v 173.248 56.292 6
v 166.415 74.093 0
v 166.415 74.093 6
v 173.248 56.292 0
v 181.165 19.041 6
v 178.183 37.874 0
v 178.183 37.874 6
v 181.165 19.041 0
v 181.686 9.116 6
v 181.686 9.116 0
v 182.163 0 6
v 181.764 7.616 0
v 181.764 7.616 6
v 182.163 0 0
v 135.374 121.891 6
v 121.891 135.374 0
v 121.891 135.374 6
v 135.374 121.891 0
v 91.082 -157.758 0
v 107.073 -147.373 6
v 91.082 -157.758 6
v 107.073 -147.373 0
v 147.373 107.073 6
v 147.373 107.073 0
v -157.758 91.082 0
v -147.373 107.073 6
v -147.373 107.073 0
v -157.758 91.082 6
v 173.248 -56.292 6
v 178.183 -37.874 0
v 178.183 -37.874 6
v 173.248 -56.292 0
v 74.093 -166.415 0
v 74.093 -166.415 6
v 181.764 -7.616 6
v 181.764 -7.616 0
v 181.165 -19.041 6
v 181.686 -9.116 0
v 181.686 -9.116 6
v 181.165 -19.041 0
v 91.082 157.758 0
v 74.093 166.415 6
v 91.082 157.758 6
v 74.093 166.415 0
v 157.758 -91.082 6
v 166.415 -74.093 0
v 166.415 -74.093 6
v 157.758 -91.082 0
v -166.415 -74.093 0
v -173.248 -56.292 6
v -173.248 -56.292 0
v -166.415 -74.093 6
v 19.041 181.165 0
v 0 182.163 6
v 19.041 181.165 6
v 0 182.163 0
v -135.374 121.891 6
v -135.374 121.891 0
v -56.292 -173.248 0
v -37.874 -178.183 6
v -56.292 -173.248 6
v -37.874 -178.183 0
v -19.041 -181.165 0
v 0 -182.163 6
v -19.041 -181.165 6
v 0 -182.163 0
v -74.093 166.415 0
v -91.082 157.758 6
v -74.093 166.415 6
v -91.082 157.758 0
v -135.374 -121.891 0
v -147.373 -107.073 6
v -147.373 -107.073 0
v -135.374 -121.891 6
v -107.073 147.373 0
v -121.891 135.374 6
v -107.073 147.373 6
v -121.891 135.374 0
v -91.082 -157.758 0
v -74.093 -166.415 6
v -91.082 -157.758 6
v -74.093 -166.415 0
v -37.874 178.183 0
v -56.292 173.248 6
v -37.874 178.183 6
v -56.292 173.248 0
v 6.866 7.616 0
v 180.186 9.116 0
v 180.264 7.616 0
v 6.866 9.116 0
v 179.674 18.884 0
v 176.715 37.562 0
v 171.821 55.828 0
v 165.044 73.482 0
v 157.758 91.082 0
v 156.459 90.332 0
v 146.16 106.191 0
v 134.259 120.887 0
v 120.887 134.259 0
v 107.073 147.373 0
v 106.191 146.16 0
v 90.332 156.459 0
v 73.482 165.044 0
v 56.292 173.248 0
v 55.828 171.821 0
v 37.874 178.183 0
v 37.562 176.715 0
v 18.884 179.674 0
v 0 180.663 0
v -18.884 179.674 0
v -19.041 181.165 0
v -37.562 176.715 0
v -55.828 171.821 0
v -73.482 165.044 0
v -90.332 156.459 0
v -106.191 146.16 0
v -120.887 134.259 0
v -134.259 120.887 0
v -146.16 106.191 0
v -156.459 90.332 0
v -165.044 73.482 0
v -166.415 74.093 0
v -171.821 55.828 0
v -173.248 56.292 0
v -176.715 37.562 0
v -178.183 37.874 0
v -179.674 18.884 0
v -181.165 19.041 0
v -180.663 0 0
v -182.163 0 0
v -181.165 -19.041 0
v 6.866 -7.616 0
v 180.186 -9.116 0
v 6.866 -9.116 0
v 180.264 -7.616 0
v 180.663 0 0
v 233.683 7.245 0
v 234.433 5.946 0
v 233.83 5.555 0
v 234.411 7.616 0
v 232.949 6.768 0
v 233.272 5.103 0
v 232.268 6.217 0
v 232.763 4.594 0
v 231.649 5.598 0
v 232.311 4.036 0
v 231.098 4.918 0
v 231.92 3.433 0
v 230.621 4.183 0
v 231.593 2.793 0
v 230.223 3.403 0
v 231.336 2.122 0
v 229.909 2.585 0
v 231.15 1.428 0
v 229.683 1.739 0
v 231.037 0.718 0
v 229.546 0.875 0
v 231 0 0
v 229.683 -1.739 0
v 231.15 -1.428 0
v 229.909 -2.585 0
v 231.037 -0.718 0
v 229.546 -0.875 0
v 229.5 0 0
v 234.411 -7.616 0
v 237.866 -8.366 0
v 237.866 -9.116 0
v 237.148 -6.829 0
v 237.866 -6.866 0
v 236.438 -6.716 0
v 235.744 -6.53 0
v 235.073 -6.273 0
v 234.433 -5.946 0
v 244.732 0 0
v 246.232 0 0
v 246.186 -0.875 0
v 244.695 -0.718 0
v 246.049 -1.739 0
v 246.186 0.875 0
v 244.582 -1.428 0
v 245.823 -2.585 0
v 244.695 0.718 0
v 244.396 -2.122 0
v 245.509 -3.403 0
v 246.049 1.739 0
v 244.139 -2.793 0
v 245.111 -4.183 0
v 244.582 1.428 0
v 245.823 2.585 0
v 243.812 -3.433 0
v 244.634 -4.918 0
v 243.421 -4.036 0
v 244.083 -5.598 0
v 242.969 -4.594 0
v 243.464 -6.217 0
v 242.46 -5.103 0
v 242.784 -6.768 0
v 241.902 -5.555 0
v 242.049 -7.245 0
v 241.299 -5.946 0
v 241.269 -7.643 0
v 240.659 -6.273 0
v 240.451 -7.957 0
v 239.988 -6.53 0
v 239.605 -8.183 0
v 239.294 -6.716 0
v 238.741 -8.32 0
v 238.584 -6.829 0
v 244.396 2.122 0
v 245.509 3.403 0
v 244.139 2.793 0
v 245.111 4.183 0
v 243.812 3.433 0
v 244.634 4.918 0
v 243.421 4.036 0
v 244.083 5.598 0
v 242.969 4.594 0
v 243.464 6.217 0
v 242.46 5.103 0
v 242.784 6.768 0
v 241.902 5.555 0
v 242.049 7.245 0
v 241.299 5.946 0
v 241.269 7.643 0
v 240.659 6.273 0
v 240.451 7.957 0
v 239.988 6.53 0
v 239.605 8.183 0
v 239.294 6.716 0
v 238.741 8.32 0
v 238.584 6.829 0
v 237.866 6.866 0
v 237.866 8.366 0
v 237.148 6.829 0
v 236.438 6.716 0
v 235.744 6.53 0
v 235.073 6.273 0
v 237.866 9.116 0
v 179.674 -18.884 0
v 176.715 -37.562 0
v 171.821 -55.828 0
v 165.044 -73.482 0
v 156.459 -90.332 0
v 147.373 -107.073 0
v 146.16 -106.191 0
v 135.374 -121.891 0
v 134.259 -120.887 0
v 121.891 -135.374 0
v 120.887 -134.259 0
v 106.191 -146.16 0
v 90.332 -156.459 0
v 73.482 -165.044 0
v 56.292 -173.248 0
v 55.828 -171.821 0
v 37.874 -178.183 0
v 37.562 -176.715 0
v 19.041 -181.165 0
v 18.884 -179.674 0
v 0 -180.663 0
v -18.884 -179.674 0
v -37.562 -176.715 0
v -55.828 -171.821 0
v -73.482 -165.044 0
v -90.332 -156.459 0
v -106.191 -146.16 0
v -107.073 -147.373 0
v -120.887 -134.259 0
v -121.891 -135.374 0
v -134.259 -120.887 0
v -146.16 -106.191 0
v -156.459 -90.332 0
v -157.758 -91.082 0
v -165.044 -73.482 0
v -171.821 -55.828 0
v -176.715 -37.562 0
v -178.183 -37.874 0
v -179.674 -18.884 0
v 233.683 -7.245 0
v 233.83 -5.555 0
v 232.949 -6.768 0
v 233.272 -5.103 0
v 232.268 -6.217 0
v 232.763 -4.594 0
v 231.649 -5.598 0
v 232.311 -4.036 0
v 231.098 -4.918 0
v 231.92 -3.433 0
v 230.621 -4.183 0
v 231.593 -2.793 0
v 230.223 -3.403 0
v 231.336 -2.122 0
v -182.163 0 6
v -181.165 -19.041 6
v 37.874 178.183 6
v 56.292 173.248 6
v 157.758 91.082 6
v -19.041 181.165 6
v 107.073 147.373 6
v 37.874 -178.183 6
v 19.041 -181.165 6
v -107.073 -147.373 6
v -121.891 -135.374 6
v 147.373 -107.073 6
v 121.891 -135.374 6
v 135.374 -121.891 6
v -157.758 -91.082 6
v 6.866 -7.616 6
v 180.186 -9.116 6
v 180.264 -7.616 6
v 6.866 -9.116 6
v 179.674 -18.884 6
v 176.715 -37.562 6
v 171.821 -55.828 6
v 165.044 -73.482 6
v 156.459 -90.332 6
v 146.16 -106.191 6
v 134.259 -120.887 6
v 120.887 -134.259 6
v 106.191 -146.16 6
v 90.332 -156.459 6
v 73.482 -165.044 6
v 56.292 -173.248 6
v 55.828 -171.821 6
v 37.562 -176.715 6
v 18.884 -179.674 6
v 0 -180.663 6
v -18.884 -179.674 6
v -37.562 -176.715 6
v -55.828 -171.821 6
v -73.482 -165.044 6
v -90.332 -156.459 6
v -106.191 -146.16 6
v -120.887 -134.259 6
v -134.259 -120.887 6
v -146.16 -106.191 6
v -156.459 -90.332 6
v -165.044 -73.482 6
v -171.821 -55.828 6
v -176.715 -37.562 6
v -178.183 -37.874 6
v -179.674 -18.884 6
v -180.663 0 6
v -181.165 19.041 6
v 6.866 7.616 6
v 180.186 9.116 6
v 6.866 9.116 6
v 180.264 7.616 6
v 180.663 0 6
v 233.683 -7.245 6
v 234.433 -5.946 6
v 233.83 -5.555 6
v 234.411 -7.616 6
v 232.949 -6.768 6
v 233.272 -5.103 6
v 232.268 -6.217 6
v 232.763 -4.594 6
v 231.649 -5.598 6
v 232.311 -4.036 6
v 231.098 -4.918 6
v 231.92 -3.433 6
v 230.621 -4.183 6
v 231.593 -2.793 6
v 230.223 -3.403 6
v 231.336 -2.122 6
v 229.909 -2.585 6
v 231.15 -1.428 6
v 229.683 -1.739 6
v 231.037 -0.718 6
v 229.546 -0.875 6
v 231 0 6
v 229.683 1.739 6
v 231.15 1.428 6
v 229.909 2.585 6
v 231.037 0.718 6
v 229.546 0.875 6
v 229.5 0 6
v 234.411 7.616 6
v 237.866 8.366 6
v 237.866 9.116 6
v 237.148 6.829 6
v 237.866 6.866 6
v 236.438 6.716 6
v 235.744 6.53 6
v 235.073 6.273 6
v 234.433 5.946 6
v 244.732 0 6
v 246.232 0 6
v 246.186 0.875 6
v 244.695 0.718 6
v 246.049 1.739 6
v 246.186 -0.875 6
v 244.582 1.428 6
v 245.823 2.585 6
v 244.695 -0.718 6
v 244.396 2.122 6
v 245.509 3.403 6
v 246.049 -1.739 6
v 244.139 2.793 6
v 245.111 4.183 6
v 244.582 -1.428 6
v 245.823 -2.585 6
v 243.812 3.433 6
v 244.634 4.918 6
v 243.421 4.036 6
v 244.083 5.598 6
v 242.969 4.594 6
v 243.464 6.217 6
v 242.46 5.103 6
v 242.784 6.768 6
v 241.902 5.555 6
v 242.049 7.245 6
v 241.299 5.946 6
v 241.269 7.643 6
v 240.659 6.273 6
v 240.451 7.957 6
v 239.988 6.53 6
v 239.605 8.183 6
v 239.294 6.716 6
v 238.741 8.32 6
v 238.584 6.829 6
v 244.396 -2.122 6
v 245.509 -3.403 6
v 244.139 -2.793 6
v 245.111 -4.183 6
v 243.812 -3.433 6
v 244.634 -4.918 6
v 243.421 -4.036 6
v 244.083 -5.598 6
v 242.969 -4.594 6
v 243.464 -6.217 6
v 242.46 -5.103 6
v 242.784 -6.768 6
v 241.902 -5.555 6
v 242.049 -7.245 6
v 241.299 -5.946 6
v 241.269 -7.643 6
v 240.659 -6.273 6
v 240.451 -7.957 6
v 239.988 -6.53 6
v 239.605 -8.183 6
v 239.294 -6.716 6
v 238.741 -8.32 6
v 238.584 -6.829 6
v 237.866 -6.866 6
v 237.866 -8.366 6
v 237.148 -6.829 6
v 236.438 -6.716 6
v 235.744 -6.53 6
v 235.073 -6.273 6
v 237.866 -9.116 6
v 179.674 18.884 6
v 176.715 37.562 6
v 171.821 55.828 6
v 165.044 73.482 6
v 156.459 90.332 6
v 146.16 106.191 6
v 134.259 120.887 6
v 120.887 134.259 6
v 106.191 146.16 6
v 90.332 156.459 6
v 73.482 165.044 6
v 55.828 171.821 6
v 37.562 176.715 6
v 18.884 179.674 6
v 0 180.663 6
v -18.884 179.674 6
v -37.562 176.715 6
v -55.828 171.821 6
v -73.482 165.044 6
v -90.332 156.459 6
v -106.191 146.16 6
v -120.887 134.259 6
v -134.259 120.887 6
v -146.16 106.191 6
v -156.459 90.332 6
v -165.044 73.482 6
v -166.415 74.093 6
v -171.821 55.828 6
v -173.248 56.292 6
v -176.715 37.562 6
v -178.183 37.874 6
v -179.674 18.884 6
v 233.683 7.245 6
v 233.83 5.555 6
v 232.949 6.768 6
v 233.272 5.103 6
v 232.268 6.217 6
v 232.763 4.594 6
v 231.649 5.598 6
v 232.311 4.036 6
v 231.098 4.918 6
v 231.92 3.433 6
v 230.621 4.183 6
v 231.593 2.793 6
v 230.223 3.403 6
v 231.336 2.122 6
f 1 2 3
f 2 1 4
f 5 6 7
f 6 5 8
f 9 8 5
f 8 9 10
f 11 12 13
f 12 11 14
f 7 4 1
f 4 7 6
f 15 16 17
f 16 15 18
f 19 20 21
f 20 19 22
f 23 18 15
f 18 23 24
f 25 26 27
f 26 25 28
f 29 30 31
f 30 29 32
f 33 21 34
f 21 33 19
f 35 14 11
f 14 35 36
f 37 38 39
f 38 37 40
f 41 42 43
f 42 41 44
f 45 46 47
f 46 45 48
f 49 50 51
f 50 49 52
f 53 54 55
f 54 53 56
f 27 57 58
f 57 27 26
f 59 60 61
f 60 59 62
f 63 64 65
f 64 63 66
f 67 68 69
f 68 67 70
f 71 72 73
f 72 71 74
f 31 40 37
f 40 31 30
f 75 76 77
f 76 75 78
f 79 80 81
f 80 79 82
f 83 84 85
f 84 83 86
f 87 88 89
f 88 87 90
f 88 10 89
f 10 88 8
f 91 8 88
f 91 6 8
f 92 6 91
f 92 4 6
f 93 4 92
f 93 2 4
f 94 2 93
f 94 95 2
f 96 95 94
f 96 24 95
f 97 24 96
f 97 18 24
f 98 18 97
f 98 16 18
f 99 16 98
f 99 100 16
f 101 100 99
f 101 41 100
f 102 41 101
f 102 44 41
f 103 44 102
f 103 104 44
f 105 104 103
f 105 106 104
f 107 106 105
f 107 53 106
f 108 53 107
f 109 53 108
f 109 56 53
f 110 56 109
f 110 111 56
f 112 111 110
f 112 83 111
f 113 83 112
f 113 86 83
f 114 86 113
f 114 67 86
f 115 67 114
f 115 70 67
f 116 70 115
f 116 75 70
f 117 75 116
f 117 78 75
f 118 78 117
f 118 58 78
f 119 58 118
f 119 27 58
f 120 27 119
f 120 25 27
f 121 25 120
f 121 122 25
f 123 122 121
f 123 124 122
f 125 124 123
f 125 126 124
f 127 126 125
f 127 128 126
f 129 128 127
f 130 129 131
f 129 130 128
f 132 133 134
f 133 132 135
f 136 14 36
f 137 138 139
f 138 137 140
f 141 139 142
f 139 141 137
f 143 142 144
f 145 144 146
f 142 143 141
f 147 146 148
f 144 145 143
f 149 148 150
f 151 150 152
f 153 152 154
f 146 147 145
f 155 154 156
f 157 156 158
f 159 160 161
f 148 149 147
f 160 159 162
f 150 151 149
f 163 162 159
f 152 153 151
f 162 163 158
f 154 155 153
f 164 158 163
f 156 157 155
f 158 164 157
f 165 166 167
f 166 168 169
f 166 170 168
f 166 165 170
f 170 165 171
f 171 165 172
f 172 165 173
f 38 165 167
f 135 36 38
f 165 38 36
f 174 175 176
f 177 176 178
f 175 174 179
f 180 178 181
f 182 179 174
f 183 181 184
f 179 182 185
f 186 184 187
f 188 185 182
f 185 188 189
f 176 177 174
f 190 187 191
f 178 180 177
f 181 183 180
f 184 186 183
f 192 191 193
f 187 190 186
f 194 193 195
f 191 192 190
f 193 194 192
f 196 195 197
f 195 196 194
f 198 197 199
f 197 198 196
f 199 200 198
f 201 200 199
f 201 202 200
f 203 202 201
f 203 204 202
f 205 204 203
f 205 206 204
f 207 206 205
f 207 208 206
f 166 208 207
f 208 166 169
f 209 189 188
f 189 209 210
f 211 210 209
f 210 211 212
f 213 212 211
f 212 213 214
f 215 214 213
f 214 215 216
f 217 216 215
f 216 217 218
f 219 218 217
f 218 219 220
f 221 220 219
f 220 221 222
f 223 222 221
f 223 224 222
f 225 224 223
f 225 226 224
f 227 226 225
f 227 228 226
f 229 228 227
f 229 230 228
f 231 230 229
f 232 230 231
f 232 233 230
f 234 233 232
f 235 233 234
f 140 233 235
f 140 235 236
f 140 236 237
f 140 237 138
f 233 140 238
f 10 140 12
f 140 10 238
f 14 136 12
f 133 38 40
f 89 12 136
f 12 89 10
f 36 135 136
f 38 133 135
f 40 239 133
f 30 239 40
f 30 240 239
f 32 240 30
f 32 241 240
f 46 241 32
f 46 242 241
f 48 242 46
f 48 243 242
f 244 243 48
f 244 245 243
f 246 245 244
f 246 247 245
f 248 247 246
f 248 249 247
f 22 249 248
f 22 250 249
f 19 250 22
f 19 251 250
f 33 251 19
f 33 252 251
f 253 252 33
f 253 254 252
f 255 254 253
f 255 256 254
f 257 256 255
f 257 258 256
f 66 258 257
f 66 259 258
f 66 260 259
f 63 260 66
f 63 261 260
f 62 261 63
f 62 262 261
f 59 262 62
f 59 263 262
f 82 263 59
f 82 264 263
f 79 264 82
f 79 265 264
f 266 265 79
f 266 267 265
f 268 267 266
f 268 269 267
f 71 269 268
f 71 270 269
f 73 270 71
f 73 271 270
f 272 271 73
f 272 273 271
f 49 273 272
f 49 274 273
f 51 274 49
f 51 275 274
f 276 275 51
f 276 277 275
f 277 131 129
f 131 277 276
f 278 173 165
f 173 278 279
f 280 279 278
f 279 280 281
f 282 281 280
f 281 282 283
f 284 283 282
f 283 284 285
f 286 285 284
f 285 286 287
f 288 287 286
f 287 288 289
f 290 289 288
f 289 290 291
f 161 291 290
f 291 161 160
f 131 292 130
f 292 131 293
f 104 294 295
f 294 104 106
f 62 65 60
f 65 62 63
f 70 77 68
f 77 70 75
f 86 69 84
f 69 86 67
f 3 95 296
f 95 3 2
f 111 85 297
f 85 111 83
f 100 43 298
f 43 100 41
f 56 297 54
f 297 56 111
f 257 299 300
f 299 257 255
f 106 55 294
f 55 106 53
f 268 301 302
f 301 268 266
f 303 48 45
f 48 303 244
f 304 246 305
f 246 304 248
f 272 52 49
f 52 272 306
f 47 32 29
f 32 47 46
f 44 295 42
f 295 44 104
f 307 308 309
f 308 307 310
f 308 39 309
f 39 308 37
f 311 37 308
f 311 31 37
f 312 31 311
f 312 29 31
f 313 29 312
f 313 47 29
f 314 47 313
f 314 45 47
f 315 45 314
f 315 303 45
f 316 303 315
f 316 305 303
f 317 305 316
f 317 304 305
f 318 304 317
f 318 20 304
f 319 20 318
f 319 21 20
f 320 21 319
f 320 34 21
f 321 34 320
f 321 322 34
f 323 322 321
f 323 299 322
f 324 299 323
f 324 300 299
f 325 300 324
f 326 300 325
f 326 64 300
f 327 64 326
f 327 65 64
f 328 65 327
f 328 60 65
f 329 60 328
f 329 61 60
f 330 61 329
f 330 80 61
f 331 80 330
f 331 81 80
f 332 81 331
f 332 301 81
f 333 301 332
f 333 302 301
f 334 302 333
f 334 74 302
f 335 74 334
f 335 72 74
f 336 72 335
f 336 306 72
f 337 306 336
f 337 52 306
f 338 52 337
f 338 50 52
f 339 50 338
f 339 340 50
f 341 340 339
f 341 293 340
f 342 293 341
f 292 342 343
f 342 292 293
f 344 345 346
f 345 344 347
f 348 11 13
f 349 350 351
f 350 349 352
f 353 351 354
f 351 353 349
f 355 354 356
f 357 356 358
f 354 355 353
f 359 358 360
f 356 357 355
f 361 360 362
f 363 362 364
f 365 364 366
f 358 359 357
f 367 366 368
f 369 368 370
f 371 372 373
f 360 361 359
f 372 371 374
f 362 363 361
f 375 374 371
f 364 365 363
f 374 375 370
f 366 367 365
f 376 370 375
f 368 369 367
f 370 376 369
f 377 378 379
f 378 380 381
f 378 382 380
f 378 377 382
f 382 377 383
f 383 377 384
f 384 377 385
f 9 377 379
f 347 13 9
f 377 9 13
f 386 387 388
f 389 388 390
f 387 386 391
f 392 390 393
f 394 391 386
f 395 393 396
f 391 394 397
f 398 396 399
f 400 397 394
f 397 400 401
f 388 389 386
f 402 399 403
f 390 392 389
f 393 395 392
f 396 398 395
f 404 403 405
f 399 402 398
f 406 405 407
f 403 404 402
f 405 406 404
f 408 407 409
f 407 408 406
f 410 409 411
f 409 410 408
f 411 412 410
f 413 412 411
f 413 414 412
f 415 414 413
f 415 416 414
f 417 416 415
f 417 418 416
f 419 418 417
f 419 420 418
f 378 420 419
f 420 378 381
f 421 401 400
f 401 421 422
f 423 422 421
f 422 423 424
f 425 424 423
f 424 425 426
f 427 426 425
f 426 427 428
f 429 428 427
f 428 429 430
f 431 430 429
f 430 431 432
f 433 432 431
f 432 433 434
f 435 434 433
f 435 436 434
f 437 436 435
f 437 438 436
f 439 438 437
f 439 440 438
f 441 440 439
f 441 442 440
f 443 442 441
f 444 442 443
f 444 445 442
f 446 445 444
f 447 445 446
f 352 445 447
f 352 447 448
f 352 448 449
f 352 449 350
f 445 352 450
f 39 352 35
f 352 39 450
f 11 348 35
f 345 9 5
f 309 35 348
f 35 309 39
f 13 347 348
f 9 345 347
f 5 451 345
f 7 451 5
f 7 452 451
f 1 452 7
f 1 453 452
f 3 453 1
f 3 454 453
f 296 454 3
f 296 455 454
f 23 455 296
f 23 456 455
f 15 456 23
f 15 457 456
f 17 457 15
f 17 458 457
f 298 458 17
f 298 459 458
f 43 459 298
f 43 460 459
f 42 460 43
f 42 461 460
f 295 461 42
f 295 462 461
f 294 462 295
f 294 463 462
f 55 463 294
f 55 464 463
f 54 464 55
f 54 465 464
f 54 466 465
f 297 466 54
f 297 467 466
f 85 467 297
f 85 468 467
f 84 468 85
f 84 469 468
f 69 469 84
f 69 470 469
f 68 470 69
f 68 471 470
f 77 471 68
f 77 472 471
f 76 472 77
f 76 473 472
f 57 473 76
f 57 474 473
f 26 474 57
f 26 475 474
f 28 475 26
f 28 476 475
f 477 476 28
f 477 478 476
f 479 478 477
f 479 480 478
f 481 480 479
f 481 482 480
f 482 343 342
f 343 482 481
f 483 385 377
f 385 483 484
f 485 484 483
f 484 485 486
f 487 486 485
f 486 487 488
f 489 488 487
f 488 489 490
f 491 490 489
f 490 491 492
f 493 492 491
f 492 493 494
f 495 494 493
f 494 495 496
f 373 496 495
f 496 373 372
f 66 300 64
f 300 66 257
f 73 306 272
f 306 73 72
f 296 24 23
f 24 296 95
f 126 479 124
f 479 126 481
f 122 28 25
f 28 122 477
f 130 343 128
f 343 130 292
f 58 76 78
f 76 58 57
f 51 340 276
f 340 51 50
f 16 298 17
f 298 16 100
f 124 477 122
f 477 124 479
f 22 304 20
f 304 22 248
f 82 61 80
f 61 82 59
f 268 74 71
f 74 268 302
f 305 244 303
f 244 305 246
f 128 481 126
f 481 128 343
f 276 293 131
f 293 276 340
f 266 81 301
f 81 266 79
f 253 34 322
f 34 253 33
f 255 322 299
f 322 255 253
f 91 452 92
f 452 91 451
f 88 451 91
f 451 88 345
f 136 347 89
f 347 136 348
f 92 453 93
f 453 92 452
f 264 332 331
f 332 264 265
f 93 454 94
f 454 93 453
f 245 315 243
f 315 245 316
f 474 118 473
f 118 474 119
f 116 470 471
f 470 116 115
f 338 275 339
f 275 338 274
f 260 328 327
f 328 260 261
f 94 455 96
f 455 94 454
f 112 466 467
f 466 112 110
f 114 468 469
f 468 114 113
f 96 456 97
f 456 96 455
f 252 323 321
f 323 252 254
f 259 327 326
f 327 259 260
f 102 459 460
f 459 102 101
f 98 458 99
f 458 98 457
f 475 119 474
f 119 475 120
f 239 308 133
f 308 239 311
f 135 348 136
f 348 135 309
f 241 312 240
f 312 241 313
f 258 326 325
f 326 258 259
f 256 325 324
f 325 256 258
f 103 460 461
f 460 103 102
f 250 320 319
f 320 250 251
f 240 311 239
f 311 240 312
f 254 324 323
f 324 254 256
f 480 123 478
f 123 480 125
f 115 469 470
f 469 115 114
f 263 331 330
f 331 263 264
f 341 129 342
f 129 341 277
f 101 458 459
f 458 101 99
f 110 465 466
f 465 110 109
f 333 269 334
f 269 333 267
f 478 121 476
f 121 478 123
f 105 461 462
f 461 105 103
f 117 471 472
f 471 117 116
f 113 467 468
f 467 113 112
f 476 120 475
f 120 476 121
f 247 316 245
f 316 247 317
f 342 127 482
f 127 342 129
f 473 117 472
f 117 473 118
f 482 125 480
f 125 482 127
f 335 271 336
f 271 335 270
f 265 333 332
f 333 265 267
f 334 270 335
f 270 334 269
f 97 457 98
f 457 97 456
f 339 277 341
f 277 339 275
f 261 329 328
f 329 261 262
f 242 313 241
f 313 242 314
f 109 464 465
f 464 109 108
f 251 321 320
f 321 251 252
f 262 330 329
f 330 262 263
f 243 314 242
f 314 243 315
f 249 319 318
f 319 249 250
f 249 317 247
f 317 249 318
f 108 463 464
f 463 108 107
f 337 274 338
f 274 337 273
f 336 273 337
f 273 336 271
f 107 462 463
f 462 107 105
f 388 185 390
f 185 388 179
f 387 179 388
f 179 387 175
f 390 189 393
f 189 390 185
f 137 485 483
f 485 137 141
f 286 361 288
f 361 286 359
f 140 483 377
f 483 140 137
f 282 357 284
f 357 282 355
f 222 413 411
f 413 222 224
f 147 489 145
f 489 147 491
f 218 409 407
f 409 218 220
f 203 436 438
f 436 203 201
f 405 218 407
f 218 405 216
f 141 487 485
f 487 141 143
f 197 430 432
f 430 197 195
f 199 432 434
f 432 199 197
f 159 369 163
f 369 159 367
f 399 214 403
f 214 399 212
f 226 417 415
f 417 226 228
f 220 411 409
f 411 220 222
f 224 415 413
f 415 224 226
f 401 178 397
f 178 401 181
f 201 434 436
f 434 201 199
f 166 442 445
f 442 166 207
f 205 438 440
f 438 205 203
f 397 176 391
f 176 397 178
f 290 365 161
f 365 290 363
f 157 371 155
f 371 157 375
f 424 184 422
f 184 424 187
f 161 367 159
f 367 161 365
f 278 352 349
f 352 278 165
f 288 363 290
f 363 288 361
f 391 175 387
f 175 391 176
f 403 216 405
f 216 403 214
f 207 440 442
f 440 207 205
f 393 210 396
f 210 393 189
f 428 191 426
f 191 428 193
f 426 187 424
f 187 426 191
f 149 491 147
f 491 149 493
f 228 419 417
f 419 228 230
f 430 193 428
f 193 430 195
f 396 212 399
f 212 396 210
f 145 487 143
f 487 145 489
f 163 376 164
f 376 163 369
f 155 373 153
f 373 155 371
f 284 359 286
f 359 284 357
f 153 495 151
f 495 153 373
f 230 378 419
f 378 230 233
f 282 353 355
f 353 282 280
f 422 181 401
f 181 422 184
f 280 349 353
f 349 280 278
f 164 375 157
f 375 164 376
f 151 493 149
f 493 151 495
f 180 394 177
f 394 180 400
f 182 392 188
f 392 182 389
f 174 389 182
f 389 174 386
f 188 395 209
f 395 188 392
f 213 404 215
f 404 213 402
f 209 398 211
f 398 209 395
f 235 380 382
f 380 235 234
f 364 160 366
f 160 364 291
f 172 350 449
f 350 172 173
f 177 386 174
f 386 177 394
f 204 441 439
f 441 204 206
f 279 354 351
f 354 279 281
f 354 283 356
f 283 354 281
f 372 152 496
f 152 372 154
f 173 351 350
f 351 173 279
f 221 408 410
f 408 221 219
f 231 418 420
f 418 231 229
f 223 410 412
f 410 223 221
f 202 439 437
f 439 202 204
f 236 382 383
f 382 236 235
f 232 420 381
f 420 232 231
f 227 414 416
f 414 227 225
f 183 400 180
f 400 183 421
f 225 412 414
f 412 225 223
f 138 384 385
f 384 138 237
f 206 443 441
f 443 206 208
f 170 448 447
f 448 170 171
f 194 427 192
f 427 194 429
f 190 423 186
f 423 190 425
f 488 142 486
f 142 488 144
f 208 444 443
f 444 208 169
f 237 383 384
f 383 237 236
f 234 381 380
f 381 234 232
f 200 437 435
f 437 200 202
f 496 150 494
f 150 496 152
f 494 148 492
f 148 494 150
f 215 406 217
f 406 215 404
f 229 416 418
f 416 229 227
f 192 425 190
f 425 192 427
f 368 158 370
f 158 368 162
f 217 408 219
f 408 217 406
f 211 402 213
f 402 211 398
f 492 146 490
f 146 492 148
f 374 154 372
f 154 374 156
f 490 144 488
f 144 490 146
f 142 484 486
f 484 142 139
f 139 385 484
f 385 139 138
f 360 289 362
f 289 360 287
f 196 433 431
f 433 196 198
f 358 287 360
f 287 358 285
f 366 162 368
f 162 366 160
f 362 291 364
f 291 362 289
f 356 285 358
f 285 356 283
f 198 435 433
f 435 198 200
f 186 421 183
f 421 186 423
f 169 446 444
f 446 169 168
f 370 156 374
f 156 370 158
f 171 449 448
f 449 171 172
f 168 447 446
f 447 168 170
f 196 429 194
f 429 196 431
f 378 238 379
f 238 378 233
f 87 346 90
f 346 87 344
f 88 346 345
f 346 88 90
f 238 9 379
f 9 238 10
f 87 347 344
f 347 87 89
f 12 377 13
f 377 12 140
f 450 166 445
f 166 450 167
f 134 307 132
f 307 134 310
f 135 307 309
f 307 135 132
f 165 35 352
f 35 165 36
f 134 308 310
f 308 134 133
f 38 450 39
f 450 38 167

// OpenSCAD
// file: _params.scad
// =========================================================================
// 공유 파라미터 (모든 개별 부품 파일에서 include)
// 메인 어셈블리: cup_z_x_catrage_frame_water_mic_anti_3030.scad 에서 추출
// 프레임: 600 × 420 × 700mm (3030 프로파일, Y=0 대칭)
// =========================================================================

$fn = 60;  // 부품 출력용 고해상도
GLOBAL_TOLERANCE = 0.2;

// --- [1] 하부 기성품 및 원통 파라미터 ---
X_RAIL_LEN = 290.0;
X_BLOCK_W = 30.0; X_BLOCK_L = 32.0;   // 신규 X슬라이더 블록 (폭 30mm × 길이 32mm)
X_PITCH_X = 20.0; X_PITCH_Y = 20.0;   // 체결 홀 피치 (20 × 20mm, M3 나사탭 4개)
X_RAIL_W = 30.0;  X_RAIL_H = 20.0;   // 레일 폭 30mm (레일 바닥~블록 윗면 높이 29mm 반영)
X_TOTAL_H = 29.0;                    // 레일 바닥에서 슬라이더 블록 윗면까지의 높이

MOTOR_W = 42.0;      MOTOR_PITCH = 31.0; MOTOR_HOLE_D = 3.5;    
MOTOR_BOSS_D = 22.0; MOTOR_BOSS_H = 2.0; SCREW_D = 8.0;         
MOT_BODY_L = 41.0;   SHAFT_L = 24.0;     // 실측 NEMA17 몸통 41mm / 축 돌출 24mm

CUP_ID = 99.5;  CUP_WALL = 5.0; CUP_OD = 110.0;     // 아크릴 원통 OD110/ID100
CUP_H = 180.0;   CAGE_H = 60.0;  FLOOR_H = 10.0; PISTON_H = 20.0;     

LIP_D = 30.0;    LIP_H = 5.0;    LEAK_DRAIN_D = 4.0;    
GUIDE_PIPE_D = 8.0; BUSHING_OD = 12.0; BUSHING_H = 8.0;       
DRAIN_RADIUS = 35.0; DRAIN_D = 8.0;        

Y_OFFSET = 85.0; BRKT_H = 12.0; BRKT_D = 122.0; BRKT_ID = 62.0; Z_MOUNT_PCD = 86.0;   

// --- [2] 아크릴 파이프 및 상부 카트리지 ---
ACRYL_ID = 100.0; ACRYL_T = 5.0; ACRYL_OD = ACRYL_ID + (ACRYL_T * 2);  // OD110 (아크릴집 106 재고없음 → 컵과 동일 규격)

REVOLVER_PCD = 240.0;     // 인접 카트리지 웹 9.8mm 확보 (OD110 대응, 230→240)
CARTRIDGE_OD = REVOLVER_PCD + ACRYL_OD + 8; 
TOP_PLATE_H = 15.0;       // 아크릴 15T 통판 (보스홀 단 깊이 10mm)

HUB_D = 60.0;            
SHAFT_D = 12.0;          
HUB_WALL = 4.0;          
HUB_H = 15.0;             // 아크릴 5T × 3장 적층 — 파이프 130mm 대응
POCKET_DEPTH = 5.0;
MID_HUB_Z = 63.5;          // 중단 허브 하면 Z (벨트 중심 Z=71.0mm 정렬, 풀리 상단 Z=75.0mm = 축상단-1mm)
UPPER_HUB_Z = 135.0;       // 상단 허브 하면 Z (전체 135+15=150 유지)
BOSS_OD = 35.0;
BOSS_H = 11.0;             // 보스11 + 와셔1 = 12, 리세스10 → 허브 2mm 공중

// --- [3] GT2 벨트 구동 시스템 ---
GT2_PITCH     = 2.0;
GT2_BELT_W    = 6.0;
BIG_PULLEY_TEETH = 566;
BIG_PULLEY_PD = BIG_PULLEY_TEETH * GT2_PITCH / PI;
BIG_PULLEY_OD = BIG_PULLEY_PD + 1.0;
SMALL_PULLEY_TEETH = 20;
SMALL_PULLEY_PD = SMALL_PULLEY_TEETH * GT2_PITCH / PI;
SMALL_PULLEY_OD = SMALL_PULLEY_PD + 1.0;

BELT_MOTOR_X = -300;
BELT_MOTOR_Y = -155.5;
BRKT_MOTOR_H = 25.0;
BRKT_MOTOR_W = 45.0;        // 브래킷 폭 45mm (프로파일 간섭 회피 복원)
SLOT_LEN = 10.0;
FLAG_W = 15.0;  FLAG_H = 8.0;  FLAG_T = 1.5;

X_POS_MEASURE = 170.0;   // 측정 브래킷 X좌표 (X_M~X_R 정중앙, X대칭)

// --- [4] 3030 프레임 경계 (600×430×700mm) ---
PF = 30;             // 3030 알루미늄 프로파일
WASHER_T = 1.0;     

X_L = -320;
X_M = 60;
X_R = 250;
Y_F = -210;          // 전방 (대칭: -210+30=-180, Y=0 중심)
Y_B = 180;           // 후방 (대칭: 180+30=210, Y=0 중심) — 메인파일과 동기화

Z_BOT = -480;
Z_RAIL = -322;
Z_MID = -TOP_PLATE_H - PF;
Z_TOP = 220;

SUPPORT_PILLAR_H = Z_TOP - PF;

SHAFT_SQ = 20;       // 2020 사각 회전축

// 사각 축 홀 크기
SQ = SHAFT_SQ + GLOBAL_TOLERANCE;  // 20.2mm

// --- 리볼버/컵 축 정렬 (보스홀=판 중심에 리볼버 정렬) ---
REVOLVER_CX = (X_L + X_M + PF)/2;        // 판 중심 = 보스홀 = 리볼버 회전축 (-115)
DROP_X      = REVOLVER_CX + REVOLVER_PCD/2;  // 링 드롭 / 컵 적재 축 (+5)

FLANGE_Z = 52.0;       // 모터 전면 안착 높이 (Z=52mm -> 축 상단 Z=76mm, 풀리 결합)

// --- [5] 모터 체결홀 (이미 제작 완료된 15T 상판 원본 도면 수치 100% 유지) ---
MOTOR_BOLT_PITCH     = 25.0;      // Y피치 (Y = ±12.5mm)
MOTOR_BOLT_X_NOMINAL = X_L + 55;  // 1열: 상판 좌단 55 (모터축 기준 +35mm = X=-265mm)
MOTOR_BOLT_X_SHIFT   = X_L + 40;  // 2열: 상판 좌단 40 (모터축 기준 +20mm = X=-280mm)

// 모터 마운트 볼트 카운터보어 (단볼트용 — 브래킷 두께 25 중 깊게 파냄)
MOTOR_CB_D     = 6.5;            // M3 캡볼트 머리 클리어런스
MOTOR_CB_DEPTH = 19;             // 카운터보어 깊이 (잔여 통과 6mm → M3×10 단볼트)
// main file
// =========================================================================
// [구매] GT2 타이밍 벨트
// 구매: GT2 6mm 폭 오픈 벨트, 필요 길이 산출
// 큰 풀리(하단 허브 외주 550T) ↔ 작은 풀리(모터 20T) 연결
// =========================================================================
include <_params.scad>

// 벨트 경로 계산
// 모터 위치: (BELT_MOTOR_X, BELT_MOTOR_Y) 기준, 리볼버 축: (-REVOLVER_PCD/2, 0)
DX = BELT_MOTOR_X - (-REVOLVER_PCD/2);
DY = BELT_MOTOR_Y - 0;
CENTER_DIST = sqrt(DX*DX + DY*DY);
BELT_T = 1.5;  // 벨트 두께

// 간이 벨트 시각화 (두 풀리 간 직선 + 풀리 외주 감김)
color([0.15, 0.15, 0.15, 0.7]) {
    // 큰 풀리 감김 (중단 허브 외주)
    translate([0, 0, 0]) difference() {
        cylinder(d=BIG_PULLEY_OD + BELT_T*2, h=GT2_BELT_W);
        translate([0, 0, -1]) cylinder(d=BIG_PULLEY_OD, h=GT2_BELT_W + 2);
    }
    // 작은 풀리 감김 (모터)
    translate([CENTER_DIST, 0, 0]) difference() {
        cylinder(d=SMALL_PULLEY_OD + BELT_T*2, h=GT2_BELT_W);
        translate([0, 0, -1]) cylinder(d=SMALL_PULLEY_OD, h=GT2_BELT_W + 2);
    }
    // 직선 구간 (상하 2개)
    R1 = BIG_PULLEY_OD/2;
    R2 = SMALL_PULLEY_OD/2;
    // 상부 직선
    translate([R2, R2 + BELT_T/2, 0])
        cube([CENTER_DIST - R2, BELT_T, GT2_BELT_W]);
    // 하부 직선
    translate([R2, -(R2 + BELT_T/2 + BELT_T), 0])
        cube([CENTER_DIST - R2, BELT_T, GT2_BELT_W]);
}
